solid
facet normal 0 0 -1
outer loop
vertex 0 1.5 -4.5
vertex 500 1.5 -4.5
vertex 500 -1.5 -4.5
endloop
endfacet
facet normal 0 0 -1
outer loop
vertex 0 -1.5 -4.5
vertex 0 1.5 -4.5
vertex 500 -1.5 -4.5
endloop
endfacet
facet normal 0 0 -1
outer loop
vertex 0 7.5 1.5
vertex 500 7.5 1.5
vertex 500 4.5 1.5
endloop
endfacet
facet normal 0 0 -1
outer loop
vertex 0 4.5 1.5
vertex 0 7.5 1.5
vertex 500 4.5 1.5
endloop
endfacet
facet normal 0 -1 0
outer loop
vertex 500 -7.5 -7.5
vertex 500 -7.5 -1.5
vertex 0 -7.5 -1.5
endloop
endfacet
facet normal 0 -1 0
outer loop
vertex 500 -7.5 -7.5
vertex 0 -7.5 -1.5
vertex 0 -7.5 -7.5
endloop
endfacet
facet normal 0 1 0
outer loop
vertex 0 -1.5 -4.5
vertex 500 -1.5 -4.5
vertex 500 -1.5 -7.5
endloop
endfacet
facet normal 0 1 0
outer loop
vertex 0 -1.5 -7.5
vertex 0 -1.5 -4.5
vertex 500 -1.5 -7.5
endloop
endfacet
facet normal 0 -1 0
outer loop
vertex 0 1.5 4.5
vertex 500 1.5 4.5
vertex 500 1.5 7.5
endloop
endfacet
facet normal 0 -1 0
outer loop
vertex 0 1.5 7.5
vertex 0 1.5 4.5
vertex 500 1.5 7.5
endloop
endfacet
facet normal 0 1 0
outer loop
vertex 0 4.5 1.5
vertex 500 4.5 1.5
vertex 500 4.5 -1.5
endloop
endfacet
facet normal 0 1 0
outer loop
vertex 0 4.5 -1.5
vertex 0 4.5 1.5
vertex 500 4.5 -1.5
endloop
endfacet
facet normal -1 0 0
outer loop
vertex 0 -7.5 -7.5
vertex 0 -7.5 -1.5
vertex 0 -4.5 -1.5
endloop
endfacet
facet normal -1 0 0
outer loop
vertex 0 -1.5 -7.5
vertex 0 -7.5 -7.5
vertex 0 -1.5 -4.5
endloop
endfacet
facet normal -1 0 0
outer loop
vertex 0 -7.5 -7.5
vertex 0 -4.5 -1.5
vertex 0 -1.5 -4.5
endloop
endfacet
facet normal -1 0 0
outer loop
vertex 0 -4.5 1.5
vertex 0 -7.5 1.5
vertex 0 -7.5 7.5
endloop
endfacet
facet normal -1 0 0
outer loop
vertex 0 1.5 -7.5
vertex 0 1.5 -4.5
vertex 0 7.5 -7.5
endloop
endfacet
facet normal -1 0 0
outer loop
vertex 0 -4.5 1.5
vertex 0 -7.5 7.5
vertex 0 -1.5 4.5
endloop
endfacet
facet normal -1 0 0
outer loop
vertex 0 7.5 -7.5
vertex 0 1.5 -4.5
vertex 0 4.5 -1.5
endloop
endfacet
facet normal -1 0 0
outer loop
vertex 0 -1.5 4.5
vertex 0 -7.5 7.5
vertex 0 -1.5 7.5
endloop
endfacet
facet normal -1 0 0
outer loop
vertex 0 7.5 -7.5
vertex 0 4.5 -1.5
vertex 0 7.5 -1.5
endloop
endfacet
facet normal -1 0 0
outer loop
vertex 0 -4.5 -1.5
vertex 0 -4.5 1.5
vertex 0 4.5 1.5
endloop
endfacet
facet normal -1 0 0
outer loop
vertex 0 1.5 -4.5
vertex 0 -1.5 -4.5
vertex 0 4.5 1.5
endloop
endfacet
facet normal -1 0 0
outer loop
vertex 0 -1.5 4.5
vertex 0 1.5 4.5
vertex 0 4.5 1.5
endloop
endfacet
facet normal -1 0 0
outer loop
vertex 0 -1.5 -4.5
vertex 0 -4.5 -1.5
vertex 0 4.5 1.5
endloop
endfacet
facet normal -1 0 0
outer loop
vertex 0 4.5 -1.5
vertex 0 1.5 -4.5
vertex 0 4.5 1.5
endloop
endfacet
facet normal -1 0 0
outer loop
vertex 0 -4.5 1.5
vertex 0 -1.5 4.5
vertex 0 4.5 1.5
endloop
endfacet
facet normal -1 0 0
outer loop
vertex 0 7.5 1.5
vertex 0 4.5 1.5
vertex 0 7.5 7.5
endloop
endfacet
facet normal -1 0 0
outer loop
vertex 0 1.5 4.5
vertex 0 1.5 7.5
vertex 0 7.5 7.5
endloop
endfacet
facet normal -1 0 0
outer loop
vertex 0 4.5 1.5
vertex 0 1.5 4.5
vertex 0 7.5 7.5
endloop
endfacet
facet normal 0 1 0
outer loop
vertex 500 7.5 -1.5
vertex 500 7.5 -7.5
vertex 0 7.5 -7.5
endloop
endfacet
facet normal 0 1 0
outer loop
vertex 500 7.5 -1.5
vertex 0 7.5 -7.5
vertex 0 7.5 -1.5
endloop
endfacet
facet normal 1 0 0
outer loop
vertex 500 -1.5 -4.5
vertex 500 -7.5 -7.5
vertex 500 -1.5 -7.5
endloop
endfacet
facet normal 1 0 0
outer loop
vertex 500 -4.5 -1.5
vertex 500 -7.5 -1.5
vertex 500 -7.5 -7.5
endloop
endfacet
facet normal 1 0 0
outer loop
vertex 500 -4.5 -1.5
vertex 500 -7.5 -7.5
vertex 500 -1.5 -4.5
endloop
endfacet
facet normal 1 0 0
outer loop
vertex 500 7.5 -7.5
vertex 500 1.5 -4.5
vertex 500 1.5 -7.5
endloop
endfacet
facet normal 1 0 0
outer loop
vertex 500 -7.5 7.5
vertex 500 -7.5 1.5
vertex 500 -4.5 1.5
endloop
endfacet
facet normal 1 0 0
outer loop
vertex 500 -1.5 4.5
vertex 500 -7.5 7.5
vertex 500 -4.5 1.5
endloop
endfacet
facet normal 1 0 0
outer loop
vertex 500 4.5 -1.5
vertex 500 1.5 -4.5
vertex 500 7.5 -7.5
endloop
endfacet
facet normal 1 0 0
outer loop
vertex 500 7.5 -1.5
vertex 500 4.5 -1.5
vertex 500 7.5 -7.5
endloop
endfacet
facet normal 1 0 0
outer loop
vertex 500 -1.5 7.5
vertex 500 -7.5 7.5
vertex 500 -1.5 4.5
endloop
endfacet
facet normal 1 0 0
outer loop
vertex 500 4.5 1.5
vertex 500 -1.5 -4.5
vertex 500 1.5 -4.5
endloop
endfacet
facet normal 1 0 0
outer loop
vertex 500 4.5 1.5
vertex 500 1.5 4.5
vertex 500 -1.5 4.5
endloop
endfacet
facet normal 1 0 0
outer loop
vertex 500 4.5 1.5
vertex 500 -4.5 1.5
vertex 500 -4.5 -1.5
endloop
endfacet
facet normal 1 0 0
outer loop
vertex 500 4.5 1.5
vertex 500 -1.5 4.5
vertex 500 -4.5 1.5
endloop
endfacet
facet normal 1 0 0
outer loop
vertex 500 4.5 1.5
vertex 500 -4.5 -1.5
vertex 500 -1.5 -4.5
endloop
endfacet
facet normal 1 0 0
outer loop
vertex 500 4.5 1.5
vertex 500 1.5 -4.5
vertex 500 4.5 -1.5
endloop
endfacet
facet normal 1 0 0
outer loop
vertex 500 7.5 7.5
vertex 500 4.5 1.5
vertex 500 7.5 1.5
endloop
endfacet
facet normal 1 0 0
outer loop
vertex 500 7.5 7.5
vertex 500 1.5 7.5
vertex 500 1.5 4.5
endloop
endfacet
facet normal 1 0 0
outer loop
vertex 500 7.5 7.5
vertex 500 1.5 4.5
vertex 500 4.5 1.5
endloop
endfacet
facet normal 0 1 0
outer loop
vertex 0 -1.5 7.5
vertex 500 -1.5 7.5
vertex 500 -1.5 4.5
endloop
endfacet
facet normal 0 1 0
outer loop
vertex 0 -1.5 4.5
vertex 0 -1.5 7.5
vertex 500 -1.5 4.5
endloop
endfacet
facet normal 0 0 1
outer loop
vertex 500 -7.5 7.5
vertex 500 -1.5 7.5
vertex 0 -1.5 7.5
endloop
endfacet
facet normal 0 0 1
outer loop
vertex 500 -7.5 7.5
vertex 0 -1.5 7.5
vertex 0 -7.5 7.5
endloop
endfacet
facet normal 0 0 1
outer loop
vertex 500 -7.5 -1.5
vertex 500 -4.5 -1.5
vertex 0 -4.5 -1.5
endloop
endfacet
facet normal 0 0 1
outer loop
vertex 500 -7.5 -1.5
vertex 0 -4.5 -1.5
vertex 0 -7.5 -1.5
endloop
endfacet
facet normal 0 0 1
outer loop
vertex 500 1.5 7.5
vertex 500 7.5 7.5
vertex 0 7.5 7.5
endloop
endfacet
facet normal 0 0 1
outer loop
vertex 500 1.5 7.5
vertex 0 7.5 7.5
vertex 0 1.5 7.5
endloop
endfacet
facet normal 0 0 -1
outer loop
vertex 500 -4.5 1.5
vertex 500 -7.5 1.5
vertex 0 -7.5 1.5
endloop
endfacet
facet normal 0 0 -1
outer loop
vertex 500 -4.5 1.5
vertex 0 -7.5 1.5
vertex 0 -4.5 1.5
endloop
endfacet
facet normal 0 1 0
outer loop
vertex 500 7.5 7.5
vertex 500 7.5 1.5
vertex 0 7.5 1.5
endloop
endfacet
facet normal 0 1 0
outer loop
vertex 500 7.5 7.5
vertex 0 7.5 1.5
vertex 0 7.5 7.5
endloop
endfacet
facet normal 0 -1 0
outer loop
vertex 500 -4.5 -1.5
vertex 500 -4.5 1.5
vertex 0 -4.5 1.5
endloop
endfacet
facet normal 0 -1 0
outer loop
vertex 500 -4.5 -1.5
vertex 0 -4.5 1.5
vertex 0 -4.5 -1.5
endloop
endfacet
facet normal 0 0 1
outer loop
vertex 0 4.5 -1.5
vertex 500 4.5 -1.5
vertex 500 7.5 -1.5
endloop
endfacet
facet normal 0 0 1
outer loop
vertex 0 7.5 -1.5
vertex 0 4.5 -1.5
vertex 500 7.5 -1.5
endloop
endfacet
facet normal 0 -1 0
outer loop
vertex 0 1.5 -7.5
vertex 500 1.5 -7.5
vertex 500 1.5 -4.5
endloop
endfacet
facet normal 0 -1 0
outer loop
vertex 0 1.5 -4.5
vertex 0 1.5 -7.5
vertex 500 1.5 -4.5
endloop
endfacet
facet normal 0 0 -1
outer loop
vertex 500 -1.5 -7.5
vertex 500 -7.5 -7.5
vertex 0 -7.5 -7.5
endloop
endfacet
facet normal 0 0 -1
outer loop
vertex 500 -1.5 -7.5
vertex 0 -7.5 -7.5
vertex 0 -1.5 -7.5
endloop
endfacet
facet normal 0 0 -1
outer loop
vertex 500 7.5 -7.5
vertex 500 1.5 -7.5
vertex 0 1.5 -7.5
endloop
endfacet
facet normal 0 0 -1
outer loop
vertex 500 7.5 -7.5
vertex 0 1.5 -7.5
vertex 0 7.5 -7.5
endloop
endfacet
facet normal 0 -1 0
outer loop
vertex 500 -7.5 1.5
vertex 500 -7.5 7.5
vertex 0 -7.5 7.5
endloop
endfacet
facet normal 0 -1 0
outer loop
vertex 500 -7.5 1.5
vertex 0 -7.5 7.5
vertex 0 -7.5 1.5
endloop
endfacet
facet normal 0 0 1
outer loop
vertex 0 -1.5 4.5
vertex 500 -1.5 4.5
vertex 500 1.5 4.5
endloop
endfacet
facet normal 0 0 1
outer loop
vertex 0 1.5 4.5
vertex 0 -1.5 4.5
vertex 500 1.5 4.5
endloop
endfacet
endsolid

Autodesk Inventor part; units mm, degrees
ref_plane "YZ Plane" through (0, 0, 0) normal (1, 0, 0) x (0, 1, 0)
ref_plane "XZ Plane" through (0, 0, 0) normal (0, 1, 0) x (-1, 0, 0)
ref_plane "XY Plane" through (0, 0, 0) normal (0, 0, 1) x (1, 0, 0)
sketch "Sketch1" plane through (0, 0, 0) normal (1, 0, 0) x (0, 1, 0)
  line L0 (-7.5, -7.5) -> (7.5, -7.5)
  line L1 (7.5, -7.5) -> (7.5, 7.5)
  line L2 (7.5, 7.5) -> (-7.5, 7.5)
  line L3 (-7.5, 7.5) -> (-7.5, -7.5)
  line L4 (-7.5, -7.5) -> (7.5, 7.5) construction
  line L5 (7.5, -7.5) -> (-7.5, 7.5) construction
  line L6 (7.5, 1.5) -> (4.5, 1.5)
  line L7 (4.5, 1.5) -> (4.5, -1.5)
  line L8 (4.5, -1.5) -> (7.5, -1.5)
  line L9 (7.5, -1.5) -> (7.5, 1.5)
  line L10 (1.5, 7.5) -> (-1.5, 7.5)
  line L11 (-1.5, 7.5) -> (-1.5, 4.5)
  line L12 (-1.5, 4.5) -> (1.5, 4.5)
  line L13 (1.5, 4.5) -> (1.5, 7.5)
  line L14 (-7.5, 1.5) -> (-4.5, 1.5)
  line L15 (-4.5, 1.5) -> (-4.5, -1.5)
  line L16 (-4.5, -1.5) -> (-7.5, -1.5)
  line L17 (-7.5, -1.5) -> (-7.5, 1.5)
  line L18 (-1.5, -7.5) -> (1.5, -7.5)
  line L19 (1.5, -7.5) -> (1.5, -4.5)
  line L20 (1.5, -4.5) -> (-1.5, -4.5)
  line L21 (-1.5, -4.5) -> (-1.5, -7.5)
  point P0 (0, 0)
  dimension "d0" = 15
  dimension "d1" = 3
  dimension "d2" = 3
  dimension "d3" = 1.5
  dimension "d4" = 1.5
extrude "Extrusion1" add sketch "Sketch1" along normal blind 500 contours L3 L16 L15 L14 L2 L11 L12 L13 L1 L6 L7 L8 L0 L19 L20 L21
equation "\"d3\" = 0.5 * d2"
equation "\"d4\" = d3"
properties part number "Beam_360mm" material "Aluminum 6061"
